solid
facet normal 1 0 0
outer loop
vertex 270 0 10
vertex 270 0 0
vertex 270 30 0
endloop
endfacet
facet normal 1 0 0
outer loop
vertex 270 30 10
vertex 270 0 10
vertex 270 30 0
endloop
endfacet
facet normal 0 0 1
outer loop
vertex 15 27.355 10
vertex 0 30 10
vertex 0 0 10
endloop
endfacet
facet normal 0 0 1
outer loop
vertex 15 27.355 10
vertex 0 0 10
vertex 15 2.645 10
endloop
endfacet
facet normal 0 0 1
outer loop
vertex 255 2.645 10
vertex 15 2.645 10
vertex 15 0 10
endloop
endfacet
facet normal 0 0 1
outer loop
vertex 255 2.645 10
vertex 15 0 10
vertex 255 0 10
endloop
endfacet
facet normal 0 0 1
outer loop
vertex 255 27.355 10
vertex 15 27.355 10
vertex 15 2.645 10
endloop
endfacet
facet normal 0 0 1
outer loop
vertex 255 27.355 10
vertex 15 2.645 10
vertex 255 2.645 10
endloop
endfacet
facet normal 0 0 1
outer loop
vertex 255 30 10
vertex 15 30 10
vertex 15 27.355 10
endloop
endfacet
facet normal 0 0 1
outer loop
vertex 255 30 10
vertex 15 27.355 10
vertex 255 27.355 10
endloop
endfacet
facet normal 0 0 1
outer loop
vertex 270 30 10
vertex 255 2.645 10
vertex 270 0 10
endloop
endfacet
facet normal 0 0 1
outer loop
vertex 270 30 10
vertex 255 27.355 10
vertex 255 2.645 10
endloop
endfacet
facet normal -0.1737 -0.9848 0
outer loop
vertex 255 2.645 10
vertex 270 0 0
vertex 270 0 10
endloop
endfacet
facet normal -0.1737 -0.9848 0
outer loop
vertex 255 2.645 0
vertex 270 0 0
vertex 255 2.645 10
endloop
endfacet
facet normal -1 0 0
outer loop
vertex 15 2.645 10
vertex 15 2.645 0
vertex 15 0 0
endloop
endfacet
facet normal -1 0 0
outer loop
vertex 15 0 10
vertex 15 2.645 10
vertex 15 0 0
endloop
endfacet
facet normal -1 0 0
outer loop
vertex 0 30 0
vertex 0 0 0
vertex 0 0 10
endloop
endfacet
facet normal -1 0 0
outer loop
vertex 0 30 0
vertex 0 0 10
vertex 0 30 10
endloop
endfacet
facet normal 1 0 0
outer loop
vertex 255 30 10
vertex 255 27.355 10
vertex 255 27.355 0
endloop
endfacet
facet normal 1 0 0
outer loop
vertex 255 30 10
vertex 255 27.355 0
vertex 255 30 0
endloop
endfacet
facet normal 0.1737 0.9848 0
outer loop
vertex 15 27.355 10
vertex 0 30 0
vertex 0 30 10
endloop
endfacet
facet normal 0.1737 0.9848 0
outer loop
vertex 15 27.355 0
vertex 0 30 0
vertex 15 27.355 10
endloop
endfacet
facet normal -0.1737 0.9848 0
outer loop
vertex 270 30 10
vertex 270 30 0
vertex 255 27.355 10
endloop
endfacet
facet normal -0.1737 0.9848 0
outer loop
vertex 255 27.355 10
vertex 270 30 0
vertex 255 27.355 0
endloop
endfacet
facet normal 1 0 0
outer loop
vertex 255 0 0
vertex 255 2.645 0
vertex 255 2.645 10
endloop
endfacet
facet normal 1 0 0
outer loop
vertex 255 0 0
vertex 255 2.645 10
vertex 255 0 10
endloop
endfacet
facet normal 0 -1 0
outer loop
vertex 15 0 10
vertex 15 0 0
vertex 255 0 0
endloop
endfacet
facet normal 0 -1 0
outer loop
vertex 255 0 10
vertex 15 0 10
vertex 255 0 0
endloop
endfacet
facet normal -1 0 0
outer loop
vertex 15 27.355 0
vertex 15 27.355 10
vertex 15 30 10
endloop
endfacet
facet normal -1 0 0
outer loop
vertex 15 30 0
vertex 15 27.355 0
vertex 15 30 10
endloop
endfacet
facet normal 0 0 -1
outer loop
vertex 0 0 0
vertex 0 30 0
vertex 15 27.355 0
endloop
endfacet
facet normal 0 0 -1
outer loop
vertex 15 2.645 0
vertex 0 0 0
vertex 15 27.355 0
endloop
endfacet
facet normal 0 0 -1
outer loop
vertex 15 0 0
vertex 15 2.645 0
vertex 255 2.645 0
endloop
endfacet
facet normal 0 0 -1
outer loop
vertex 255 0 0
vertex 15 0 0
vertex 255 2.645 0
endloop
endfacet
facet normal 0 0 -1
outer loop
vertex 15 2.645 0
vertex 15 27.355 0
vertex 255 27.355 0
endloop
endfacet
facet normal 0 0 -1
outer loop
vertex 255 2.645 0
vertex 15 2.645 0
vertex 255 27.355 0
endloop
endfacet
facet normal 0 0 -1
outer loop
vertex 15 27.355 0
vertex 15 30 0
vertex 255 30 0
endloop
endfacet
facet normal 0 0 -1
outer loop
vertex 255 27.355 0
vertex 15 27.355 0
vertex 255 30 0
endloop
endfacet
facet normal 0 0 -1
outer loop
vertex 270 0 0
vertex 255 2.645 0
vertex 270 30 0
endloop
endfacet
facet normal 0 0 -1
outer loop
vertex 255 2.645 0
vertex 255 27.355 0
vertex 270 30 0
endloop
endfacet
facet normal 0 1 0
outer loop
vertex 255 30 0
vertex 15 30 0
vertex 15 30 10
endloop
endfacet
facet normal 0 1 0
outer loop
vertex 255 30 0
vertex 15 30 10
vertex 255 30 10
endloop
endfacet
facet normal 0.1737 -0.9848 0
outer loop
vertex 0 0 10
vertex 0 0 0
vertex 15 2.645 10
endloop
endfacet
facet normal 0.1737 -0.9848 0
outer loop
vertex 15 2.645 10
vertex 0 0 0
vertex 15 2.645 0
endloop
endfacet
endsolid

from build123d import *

# Parameters (mm, degrees)
ESQUISSE1_W                  = 270
ESQUISSE1_H                  = 30
BOSS_EXTRU_1_DEPTH           = 10
ENL_V_MAT_EXTRU_1_DEPTH      = 272.845544381
ENL_V_MAT_EXTRU_1_DEPTH_BACK = 272.845544381


with BuildPart() as part:
    # Esquisse1 → Boss.-Extru.1 (new body)
    with BuildSketch(Plane.XY):
        with Locations((135, 15)):
            Rectangle(ESQUISSE1_W, ESQUISSE1_H)
    extrude(amount=BOSS_EXTRU_1_DEPTH)

    # Esquisse2 → Enlèv. mat.-Extru.1 (cut, two sides: drawn at the far end of the back side and taken through both)
    with BuildSketch(Plane.XY.offset(10).offset(-ENL_V_MAT_EXTRU_1_DEPTH_BACK)):
        Polygon((0, 30), (15, 27.355095289), (15, 30), align=None)
        Polygon((15, 2.644904711), (15, 0), (0, 0), align=None)
        Polygon((255, 0), (270, 0), (255, 2.644904711), align=None)
        Polygon((255, 30), (270, 30), (255, 27.355095289), align=None)
    extrude(amount=ENL_V_MAT_EXTRU_1_DEPTH + ENL_V_MAT_EXTRU_1_DEPTH_BACK, mode=Mode.SUBTRACT)


solid = part.part
